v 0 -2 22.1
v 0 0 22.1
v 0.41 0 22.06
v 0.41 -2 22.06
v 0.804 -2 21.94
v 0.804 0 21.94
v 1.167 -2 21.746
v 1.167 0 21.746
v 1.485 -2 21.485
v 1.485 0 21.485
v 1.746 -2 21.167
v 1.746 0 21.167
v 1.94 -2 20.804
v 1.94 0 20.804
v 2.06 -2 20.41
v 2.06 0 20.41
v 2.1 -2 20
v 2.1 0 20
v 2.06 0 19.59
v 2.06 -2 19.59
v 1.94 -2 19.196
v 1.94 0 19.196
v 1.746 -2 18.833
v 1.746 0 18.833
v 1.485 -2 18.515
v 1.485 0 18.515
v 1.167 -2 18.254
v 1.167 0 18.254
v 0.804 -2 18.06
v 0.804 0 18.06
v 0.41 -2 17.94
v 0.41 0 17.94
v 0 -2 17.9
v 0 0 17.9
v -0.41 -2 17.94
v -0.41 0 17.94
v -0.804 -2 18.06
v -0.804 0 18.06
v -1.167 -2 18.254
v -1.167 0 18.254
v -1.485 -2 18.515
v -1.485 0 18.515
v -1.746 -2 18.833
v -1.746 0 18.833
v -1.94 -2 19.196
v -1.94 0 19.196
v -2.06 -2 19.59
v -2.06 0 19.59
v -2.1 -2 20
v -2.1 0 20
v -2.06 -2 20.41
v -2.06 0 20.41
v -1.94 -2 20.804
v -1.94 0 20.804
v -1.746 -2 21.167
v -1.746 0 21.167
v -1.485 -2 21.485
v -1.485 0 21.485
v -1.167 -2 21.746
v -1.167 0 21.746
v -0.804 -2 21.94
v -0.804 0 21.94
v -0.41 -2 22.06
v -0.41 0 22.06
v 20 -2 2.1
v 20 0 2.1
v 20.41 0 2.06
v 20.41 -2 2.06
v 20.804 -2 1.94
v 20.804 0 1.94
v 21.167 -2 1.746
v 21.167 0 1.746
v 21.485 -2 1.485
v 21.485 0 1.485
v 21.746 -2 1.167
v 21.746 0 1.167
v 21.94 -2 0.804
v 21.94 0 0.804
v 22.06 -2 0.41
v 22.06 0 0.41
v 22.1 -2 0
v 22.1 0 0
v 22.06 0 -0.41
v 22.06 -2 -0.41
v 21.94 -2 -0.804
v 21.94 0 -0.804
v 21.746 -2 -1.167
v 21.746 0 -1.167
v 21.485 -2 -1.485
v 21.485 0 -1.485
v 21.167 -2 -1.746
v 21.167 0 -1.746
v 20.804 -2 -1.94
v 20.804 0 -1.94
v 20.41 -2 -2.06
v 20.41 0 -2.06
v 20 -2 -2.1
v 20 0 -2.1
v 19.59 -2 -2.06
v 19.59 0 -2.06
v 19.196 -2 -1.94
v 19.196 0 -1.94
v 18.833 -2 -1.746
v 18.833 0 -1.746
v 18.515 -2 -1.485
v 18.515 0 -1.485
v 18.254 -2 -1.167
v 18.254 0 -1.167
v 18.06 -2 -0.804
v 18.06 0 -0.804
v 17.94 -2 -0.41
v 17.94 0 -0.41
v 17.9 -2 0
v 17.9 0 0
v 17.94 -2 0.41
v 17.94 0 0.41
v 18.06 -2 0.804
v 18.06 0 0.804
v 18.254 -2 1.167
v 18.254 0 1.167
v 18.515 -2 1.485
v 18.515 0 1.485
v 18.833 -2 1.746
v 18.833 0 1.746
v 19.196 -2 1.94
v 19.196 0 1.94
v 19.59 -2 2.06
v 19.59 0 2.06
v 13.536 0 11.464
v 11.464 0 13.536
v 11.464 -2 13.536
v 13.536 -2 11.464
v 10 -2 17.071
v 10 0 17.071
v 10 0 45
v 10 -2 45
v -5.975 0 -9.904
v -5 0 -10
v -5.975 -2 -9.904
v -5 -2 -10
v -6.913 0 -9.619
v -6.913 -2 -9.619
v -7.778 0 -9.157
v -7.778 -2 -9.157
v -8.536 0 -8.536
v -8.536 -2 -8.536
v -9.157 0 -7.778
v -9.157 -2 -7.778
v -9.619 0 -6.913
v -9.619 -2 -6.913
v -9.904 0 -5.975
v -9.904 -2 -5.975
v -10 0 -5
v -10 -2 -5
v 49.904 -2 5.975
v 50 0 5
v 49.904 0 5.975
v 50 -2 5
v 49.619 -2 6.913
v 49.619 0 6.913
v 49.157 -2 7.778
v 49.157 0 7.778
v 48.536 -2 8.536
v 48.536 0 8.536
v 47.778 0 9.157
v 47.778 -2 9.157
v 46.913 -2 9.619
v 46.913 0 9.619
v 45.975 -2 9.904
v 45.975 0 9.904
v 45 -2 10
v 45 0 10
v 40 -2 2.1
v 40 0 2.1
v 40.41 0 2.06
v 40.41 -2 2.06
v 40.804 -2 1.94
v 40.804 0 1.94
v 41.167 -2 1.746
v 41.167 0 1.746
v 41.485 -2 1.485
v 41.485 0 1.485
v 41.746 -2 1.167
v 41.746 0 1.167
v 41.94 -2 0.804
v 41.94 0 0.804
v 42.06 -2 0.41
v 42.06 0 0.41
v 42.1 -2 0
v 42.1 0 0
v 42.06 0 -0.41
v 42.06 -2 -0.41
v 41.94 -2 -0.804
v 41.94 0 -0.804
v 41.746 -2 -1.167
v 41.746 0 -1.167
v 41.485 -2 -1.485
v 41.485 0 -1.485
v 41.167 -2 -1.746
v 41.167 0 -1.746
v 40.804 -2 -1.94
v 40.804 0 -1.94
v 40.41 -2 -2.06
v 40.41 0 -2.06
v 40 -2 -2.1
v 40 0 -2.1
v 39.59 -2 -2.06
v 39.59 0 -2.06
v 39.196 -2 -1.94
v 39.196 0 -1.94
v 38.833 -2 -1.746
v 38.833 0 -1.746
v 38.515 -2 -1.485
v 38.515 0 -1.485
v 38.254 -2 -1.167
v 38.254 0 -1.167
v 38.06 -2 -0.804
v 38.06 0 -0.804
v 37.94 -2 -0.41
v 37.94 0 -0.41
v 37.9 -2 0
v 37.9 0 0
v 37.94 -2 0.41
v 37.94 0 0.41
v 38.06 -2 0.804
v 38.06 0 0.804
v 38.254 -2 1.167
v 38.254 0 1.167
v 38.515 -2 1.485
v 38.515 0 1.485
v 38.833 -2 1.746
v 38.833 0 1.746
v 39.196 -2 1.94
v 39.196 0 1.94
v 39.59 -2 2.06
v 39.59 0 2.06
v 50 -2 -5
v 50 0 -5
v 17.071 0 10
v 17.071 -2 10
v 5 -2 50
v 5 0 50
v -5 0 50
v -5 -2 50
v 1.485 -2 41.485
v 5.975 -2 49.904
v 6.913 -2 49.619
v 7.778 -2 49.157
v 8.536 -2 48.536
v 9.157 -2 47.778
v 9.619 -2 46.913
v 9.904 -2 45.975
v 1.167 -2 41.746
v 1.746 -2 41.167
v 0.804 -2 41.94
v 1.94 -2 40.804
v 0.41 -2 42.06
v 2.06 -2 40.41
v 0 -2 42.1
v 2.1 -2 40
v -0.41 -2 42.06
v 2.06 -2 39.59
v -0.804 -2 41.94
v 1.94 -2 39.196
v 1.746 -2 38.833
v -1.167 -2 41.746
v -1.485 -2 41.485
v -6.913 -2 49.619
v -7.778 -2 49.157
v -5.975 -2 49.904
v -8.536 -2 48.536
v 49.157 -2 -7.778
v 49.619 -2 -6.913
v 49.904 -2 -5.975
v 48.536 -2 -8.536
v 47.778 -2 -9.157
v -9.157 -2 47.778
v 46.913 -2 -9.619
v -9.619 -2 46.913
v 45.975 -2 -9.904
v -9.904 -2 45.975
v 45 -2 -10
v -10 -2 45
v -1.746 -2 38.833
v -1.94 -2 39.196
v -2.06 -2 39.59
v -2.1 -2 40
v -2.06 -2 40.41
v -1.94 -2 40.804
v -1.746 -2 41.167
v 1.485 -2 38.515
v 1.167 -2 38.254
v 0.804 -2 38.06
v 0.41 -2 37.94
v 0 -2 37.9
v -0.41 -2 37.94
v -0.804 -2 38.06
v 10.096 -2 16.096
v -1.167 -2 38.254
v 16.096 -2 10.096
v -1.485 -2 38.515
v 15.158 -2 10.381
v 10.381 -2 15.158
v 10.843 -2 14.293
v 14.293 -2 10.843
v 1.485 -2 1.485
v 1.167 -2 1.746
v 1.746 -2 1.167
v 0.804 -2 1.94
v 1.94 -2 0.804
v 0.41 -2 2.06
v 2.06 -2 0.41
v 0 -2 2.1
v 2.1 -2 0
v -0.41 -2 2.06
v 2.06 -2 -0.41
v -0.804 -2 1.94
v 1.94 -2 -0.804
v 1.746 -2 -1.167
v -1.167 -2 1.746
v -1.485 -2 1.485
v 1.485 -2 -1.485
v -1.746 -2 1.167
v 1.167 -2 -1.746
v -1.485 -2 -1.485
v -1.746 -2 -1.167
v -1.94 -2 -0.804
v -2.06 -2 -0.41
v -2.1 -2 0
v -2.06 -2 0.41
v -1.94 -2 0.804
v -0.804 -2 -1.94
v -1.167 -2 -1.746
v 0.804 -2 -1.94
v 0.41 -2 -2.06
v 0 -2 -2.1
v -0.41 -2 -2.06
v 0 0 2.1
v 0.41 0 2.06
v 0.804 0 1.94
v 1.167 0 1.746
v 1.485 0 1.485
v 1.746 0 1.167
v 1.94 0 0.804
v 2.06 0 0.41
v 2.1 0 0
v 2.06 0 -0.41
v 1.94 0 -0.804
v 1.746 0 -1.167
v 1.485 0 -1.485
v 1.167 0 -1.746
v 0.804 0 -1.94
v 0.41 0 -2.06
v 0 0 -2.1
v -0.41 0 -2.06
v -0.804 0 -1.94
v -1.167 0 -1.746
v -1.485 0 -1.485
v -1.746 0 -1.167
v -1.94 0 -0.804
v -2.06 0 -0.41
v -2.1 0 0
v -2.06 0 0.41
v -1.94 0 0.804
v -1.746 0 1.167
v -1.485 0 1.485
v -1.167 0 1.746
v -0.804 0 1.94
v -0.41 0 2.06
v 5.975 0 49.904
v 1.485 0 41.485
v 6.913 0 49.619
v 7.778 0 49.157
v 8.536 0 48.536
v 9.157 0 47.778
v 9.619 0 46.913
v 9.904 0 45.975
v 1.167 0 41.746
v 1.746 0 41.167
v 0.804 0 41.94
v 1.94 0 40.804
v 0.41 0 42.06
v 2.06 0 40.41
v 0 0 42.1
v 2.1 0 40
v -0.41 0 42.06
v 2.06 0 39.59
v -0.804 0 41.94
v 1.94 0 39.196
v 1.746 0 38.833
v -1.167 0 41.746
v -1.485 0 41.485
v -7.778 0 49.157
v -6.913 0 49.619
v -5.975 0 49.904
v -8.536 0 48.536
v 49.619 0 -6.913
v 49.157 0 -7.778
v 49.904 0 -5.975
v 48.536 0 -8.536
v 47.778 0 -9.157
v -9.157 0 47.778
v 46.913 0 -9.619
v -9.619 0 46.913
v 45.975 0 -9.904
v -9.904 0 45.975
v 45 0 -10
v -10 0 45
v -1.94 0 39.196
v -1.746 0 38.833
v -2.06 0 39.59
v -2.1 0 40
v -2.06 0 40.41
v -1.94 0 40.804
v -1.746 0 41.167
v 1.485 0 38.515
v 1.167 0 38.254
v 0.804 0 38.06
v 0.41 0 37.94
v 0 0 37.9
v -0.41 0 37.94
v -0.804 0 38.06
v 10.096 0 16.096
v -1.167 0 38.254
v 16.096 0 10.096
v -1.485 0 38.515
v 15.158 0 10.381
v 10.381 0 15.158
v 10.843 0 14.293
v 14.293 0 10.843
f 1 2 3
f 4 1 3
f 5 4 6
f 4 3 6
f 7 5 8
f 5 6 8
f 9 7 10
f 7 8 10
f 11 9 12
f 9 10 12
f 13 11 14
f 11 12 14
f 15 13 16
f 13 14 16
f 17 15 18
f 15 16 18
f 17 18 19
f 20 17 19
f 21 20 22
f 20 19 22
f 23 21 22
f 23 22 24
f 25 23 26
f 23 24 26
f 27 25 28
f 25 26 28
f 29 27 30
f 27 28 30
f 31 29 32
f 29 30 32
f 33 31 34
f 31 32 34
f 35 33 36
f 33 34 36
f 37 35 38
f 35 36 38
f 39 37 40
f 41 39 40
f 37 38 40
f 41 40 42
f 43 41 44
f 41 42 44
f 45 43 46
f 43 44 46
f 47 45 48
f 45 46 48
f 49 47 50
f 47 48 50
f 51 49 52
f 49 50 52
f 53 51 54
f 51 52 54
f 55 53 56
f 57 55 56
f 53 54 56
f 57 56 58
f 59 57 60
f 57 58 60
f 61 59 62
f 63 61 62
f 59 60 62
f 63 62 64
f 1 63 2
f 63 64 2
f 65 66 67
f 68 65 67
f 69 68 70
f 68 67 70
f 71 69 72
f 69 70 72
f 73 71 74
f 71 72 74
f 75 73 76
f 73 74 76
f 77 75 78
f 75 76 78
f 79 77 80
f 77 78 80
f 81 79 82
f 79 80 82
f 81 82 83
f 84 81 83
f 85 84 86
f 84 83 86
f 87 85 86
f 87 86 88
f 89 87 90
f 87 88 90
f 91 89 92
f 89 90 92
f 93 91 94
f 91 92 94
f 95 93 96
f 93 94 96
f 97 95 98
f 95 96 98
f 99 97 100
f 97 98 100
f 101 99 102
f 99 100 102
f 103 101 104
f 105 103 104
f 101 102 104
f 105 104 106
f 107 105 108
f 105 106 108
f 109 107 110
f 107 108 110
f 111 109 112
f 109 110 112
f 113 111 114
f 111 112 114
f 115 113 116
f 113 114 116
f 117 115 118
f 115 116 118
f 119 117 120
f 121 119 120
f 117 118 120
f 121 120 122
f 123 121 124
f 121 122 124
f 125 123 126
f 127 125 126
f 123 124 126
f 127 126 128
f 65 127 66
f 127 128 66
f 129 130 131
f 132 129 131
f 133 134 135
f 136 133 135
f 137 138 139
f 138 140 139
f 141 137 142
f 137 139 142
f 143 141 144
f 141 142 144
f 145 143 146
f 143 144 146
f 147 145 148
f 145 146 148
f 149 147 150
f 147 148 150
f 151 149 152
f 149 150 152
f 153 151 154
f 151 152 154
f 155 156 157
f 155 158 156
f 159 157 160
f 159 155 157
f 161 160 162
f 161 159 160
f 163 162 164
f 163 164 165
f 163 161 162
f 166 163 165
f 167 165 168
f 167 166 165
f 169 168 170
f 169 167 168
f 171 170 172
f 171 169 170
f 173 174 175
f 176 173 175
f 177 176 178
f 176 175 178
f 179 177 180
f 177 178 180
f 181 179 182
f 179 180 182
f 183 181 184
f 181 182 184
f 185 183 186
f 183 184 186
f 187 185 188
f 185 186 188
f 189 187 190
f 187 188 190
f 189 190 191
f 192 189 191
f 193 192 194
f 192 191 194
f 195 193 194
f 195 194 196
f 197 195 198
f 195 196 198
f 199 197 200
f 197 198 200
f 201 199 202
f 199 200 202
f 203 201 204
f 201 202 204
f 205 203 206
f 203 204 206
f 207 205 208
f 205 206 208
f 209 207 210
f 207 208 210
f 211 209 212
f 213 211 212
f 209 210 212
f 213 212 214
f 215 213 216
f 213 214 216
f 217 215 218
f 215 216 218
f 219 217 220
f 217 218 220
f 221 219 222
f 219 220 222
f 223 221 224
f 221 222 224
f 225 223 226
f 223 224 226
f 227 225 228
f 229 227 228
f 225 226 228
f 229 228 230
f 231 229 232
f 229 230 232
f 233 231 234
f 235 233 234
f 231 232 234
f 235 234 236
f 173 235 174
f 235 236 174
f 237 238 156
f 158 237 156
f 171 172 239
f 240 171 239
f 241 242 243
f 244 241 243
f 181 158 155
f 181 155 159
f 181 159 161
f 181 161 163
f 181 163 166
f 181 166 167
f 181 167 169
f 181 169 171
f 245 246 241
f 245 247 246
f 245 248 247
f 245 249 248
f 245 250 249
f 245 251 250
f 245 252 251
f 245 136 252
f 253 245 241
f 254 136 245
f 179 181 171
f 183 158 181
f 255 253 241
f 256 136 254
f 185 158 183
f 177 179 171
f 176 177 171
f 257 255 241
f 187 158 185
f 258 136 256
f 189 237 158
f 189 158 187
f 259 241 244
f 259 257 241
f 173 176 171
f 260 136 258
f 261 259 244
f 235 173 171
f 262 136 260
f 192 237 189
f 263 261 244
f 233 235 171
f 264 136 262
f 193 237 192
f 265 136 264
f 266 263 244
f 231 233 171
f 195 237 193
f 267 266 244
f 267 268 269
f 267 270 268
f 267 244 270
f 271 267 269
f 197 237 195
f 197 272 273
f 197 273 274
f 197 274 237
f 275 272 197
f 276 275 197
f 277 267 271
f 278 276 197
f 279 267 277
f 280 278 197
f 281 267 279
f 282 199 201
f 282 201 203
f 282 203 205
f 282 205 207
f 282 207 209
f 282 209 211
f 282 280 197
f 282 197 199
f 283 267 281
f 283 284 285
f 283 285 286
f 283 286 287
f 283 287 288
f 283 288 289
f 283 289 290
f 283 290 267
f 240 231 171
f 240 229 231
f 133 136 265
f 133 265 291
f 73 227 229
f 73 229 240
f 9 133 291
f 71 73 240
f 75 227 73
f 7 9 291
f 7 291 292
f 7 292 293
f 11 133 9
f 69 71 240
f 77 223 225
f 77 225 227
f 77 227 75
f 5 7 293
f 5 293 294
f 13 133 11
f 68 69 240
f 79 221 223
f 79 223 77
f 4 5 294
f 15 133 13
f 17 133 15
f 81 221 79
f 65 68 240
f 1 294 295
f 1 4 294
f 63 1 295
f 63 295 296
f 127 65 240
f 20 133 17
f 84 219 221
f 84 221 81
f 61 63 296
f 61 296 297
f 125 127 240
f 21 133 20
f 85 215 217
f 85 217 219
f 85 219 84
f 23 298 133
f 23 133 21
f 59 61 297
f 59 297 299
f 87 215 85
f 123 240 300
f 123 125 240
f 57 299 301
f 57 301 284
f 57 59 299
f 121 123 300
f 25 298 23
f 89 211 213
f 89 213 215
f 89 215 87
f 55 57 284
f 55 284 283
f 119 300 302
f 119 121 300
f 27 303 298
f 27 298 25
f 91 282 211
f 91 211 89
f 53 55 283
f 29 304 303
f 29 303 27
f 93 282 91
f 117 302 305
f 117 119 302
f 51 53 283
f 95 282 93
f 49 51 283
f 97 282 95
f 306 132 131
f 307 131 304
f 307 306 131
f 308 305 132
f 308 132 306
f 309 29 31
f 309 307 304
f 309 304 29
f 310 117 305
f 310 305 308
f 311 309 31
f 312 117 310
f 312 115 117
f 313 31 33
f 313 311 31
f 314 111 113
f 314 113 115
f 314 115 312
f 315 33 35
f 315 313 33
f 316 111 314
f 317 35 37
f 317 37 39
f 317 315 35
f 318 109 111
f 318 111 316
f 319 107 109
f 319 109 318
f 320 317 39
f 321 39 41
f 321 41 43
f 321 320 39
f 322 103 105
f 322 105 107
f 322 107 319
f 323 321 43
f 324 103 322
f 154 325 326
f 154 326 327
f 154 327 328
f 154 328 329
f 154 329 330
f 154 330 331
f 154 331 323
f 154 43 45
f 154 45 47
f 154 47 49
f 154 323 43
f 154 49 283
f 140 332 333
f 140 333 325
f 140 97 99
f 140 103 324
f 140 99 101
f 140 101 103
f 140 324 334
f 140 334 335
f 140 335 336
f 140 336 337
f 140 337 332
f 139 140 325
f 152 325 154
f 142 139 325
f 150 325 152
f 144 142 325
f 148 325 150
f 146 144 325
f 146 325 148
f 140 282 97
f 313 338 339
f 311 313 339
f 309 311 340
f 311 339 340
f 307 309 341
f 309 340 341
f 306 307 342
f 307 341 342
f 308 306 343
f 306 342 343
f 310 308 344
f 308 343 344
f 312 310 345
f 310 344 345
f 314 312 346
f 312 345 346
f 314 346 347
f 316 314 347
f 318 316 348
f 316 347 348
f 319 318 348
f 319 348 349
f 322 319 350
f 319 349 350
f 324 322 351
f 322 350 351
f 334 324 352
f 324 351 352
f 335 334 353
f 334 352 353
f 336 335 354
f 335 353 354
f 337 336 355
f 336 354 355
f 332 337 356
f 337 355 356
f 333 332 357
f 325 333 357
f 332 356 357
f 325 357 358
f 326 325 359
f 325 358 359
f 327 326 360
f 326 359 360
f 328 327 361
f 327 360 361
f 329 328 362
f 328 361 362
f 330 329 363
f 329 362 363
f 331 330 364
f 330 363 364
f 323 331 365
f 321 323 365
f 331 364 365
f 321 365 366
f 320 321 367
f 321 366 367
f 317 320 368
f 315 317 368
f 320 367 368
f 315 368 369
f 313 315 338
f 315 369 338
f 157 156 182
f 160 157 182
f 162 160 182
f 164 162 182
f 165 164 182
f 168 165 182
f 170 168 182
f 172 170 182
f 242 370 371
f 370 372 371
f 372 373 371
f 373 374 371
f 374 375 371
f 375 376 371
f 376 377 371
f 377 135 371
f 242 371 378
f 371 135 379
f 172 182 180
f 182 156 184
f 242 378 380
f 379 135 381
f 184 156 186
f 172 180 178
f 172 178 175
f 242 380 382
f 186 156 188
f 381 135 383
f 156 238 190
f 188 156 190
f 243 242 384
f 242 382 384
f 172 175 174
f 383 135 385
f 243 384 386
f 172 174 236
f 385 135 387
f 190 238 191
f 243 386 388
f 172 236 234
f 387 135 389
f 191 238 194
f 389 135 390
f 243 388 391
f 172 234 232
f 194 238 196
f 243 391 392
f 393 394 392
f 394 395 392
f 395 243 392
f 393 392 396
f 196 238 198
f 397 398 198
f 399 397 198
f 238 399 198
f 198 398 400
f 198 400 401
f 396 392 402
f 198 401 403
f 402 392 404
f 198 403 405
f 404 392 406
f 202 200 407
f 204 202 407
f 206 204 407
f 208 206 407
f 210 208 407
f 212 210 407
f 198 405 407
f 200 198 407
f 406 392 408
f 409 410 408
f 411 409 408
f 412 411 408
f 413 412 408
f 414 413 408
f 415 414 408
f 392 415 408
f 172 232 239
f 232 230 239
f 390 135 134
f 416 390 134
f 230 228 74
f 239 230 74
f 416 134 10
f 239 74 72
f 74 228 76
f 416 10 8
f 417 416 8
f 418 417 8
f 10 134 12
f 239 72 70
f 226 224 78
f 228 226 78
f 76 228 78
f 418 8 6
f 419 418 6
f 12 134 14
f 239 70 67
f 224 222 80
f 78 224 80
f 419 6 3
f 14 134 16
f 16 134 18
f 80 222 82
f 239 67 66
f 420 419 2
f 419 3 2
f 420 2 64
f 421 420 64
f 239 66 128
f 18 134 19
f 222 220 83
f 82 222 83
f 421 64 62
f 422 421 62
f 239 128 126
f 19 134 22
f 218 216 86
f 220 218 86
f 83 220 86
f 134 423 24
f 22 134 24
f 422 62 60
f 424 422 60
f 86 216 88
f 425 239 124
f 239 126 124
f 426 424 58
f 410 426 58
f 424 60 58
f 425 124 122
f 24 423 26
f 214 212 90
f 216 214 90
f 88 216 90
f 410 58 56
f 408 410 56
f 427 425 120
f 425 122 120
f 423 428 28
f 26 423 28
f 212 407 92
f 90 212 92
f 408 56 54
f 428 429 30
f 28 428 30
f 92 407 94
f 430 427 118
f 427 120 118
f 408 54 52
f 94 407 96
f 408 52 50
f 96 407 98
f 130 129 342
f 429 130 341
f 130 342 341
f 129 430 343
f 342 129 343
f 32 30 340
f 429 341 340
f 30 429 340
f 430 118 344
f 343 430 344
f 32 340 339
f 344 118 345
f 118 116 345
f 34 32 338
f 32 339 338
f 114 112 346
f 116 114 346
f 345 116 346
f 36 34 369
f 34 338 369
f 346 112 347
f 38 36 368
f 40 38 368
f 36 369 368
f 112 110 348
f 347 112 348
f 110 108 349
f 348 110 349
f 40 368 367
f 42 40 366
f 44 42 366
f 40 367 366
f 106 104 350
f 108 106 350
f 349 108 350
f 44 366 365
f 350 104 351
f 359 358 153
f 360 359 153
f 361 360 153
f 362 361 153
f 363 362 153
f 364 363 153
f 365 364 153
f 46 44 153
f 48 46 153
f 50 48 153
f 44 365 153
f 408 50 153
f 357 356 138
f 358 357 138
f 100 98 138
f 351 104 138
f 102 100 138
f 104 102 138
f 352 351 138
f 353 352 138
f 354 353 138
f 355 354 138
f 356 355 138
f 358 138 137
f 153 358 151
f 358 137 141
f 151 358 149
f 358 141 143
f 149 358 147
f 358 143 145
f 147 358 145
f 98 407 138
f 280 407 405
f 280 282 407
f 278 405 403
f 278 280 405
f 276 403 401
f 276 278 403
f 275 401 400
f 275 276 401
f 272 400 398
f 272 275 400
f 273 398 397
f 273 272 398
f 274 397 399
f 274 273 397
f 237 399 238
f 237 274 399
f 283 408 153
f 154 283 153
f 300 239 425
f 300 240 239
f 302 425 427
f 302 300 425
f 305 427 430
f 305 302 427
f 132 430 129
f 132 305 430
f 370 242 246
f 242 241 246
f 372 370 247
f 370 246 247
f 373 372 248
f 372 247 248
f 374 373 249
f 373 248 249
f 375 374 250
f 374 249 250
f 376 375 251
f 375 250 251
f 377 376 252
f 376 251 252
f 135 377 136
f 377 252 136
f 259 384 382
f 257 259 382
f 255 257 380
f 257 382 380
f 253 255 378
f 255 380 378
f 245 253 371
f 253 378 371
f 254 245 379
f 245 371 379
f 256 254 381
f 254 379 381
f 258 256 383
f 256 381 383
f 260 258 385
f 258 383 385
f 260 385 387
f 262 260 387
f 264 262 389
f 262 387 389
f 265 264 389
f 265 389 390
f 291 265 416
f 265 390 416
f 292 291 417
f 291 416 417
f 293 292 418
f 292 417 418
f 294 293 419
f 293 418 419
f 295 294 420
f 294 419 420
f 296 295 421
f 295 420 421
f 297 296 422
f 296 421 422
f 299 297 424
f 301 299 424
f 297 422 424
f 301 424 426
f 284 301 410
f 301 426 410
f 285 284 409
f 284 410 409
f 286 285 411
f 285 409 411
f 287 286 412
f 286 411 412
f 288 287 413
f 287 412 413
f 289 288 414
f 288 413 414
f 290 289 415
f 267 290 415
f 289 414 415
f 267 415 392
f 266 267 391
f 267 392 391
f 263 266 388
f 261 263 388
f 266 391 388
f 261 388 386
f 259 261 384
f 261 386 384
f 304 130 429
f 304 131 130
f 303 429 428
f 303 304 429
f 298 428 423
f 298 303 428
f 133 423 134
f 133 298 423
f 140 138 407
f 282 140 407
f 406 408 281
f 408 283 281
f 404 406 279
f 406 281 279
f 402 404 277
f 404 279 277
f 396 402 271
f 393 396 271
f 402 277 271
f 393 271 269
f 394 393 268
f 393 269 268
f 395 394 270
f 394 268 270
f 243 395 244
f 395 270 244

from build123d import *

# Parameters (mm, degrees)
SKETCH1_R          = 2.1
BASE_FLANGE1_DEPTH = 2
FILLET_SHAPE_R     = 5
CHAMFER2_SIZE      = 5
FILLET2_R          = 5


# Sheet-metal steps are written as plain solids
with BuildPart() as part:
    # Sketch1 → Base-Flange1 (new body)
    with BuildSketch(Plane(origin=(0, 0, 0), x_dir=(1, 0, 0), z_dir=(0, 1, 0))):
        Polygon((-10, 10), (50, 10), (50, -10), (10, -10), (10, -50), (-10, -50), align=None)
        with Locations(Location((0, 0, 0), (0, 0, 270))):
            Circle(SKETCH1_R, mode=Mode.SUBTRACT)
        with Locations(Location((20, 0, 0), (0, 0, 270))):
            Circle(SKETCH1_R, mode=Mode.SUBTRACT)
        with Locations(Location((40, 0, 0), (0, 0, 270))):
            Circle(SKETCH1_R, mode=Mode.SUBTRACT)
        with Locations(Location((0, -20, 0), (0, 0, 270))):
            Circle(SKETCH1_R, mode=Mode.SUBTRACT)
        with Locations(Location((0, -40, 0), (0, 0, 270))):
            Circle(SKETCH1_R, mode=Mode.SUBTRACT)
    extrude(amount=-BASE_FLANGE1_DEPTH)

    # Fillet_Shape
    fillet_shape_edges = [part.edges().sort_by_distance(p)[0] for p in [
        (10, -1, 50),
        (-10, -1, 50),
        (-10, -1, -10),
        (50, -1, -10),
        (50, -1, 10),
    ]]
    fillet(fillet_shape_edges, radius=FILLET_SHAPE_R)

    # Chamfer2
    chamfer2_edges = [part.edges().sort_by_distance(p)[0] for p in [
        (10, -1, 10),
    ]]
    chamfer(chamfer2_edges, length=CHAMFER2_SIZE)

    # Fillet2
    fillet2_edges = [part.edges().sort_by_distance(p)[0] for p in [
        (10, -1, 15),
        (15, -1, 10),
    ]]
    fillet(fillet2_edges, radius=FILLET2_R)


solid = part.part
